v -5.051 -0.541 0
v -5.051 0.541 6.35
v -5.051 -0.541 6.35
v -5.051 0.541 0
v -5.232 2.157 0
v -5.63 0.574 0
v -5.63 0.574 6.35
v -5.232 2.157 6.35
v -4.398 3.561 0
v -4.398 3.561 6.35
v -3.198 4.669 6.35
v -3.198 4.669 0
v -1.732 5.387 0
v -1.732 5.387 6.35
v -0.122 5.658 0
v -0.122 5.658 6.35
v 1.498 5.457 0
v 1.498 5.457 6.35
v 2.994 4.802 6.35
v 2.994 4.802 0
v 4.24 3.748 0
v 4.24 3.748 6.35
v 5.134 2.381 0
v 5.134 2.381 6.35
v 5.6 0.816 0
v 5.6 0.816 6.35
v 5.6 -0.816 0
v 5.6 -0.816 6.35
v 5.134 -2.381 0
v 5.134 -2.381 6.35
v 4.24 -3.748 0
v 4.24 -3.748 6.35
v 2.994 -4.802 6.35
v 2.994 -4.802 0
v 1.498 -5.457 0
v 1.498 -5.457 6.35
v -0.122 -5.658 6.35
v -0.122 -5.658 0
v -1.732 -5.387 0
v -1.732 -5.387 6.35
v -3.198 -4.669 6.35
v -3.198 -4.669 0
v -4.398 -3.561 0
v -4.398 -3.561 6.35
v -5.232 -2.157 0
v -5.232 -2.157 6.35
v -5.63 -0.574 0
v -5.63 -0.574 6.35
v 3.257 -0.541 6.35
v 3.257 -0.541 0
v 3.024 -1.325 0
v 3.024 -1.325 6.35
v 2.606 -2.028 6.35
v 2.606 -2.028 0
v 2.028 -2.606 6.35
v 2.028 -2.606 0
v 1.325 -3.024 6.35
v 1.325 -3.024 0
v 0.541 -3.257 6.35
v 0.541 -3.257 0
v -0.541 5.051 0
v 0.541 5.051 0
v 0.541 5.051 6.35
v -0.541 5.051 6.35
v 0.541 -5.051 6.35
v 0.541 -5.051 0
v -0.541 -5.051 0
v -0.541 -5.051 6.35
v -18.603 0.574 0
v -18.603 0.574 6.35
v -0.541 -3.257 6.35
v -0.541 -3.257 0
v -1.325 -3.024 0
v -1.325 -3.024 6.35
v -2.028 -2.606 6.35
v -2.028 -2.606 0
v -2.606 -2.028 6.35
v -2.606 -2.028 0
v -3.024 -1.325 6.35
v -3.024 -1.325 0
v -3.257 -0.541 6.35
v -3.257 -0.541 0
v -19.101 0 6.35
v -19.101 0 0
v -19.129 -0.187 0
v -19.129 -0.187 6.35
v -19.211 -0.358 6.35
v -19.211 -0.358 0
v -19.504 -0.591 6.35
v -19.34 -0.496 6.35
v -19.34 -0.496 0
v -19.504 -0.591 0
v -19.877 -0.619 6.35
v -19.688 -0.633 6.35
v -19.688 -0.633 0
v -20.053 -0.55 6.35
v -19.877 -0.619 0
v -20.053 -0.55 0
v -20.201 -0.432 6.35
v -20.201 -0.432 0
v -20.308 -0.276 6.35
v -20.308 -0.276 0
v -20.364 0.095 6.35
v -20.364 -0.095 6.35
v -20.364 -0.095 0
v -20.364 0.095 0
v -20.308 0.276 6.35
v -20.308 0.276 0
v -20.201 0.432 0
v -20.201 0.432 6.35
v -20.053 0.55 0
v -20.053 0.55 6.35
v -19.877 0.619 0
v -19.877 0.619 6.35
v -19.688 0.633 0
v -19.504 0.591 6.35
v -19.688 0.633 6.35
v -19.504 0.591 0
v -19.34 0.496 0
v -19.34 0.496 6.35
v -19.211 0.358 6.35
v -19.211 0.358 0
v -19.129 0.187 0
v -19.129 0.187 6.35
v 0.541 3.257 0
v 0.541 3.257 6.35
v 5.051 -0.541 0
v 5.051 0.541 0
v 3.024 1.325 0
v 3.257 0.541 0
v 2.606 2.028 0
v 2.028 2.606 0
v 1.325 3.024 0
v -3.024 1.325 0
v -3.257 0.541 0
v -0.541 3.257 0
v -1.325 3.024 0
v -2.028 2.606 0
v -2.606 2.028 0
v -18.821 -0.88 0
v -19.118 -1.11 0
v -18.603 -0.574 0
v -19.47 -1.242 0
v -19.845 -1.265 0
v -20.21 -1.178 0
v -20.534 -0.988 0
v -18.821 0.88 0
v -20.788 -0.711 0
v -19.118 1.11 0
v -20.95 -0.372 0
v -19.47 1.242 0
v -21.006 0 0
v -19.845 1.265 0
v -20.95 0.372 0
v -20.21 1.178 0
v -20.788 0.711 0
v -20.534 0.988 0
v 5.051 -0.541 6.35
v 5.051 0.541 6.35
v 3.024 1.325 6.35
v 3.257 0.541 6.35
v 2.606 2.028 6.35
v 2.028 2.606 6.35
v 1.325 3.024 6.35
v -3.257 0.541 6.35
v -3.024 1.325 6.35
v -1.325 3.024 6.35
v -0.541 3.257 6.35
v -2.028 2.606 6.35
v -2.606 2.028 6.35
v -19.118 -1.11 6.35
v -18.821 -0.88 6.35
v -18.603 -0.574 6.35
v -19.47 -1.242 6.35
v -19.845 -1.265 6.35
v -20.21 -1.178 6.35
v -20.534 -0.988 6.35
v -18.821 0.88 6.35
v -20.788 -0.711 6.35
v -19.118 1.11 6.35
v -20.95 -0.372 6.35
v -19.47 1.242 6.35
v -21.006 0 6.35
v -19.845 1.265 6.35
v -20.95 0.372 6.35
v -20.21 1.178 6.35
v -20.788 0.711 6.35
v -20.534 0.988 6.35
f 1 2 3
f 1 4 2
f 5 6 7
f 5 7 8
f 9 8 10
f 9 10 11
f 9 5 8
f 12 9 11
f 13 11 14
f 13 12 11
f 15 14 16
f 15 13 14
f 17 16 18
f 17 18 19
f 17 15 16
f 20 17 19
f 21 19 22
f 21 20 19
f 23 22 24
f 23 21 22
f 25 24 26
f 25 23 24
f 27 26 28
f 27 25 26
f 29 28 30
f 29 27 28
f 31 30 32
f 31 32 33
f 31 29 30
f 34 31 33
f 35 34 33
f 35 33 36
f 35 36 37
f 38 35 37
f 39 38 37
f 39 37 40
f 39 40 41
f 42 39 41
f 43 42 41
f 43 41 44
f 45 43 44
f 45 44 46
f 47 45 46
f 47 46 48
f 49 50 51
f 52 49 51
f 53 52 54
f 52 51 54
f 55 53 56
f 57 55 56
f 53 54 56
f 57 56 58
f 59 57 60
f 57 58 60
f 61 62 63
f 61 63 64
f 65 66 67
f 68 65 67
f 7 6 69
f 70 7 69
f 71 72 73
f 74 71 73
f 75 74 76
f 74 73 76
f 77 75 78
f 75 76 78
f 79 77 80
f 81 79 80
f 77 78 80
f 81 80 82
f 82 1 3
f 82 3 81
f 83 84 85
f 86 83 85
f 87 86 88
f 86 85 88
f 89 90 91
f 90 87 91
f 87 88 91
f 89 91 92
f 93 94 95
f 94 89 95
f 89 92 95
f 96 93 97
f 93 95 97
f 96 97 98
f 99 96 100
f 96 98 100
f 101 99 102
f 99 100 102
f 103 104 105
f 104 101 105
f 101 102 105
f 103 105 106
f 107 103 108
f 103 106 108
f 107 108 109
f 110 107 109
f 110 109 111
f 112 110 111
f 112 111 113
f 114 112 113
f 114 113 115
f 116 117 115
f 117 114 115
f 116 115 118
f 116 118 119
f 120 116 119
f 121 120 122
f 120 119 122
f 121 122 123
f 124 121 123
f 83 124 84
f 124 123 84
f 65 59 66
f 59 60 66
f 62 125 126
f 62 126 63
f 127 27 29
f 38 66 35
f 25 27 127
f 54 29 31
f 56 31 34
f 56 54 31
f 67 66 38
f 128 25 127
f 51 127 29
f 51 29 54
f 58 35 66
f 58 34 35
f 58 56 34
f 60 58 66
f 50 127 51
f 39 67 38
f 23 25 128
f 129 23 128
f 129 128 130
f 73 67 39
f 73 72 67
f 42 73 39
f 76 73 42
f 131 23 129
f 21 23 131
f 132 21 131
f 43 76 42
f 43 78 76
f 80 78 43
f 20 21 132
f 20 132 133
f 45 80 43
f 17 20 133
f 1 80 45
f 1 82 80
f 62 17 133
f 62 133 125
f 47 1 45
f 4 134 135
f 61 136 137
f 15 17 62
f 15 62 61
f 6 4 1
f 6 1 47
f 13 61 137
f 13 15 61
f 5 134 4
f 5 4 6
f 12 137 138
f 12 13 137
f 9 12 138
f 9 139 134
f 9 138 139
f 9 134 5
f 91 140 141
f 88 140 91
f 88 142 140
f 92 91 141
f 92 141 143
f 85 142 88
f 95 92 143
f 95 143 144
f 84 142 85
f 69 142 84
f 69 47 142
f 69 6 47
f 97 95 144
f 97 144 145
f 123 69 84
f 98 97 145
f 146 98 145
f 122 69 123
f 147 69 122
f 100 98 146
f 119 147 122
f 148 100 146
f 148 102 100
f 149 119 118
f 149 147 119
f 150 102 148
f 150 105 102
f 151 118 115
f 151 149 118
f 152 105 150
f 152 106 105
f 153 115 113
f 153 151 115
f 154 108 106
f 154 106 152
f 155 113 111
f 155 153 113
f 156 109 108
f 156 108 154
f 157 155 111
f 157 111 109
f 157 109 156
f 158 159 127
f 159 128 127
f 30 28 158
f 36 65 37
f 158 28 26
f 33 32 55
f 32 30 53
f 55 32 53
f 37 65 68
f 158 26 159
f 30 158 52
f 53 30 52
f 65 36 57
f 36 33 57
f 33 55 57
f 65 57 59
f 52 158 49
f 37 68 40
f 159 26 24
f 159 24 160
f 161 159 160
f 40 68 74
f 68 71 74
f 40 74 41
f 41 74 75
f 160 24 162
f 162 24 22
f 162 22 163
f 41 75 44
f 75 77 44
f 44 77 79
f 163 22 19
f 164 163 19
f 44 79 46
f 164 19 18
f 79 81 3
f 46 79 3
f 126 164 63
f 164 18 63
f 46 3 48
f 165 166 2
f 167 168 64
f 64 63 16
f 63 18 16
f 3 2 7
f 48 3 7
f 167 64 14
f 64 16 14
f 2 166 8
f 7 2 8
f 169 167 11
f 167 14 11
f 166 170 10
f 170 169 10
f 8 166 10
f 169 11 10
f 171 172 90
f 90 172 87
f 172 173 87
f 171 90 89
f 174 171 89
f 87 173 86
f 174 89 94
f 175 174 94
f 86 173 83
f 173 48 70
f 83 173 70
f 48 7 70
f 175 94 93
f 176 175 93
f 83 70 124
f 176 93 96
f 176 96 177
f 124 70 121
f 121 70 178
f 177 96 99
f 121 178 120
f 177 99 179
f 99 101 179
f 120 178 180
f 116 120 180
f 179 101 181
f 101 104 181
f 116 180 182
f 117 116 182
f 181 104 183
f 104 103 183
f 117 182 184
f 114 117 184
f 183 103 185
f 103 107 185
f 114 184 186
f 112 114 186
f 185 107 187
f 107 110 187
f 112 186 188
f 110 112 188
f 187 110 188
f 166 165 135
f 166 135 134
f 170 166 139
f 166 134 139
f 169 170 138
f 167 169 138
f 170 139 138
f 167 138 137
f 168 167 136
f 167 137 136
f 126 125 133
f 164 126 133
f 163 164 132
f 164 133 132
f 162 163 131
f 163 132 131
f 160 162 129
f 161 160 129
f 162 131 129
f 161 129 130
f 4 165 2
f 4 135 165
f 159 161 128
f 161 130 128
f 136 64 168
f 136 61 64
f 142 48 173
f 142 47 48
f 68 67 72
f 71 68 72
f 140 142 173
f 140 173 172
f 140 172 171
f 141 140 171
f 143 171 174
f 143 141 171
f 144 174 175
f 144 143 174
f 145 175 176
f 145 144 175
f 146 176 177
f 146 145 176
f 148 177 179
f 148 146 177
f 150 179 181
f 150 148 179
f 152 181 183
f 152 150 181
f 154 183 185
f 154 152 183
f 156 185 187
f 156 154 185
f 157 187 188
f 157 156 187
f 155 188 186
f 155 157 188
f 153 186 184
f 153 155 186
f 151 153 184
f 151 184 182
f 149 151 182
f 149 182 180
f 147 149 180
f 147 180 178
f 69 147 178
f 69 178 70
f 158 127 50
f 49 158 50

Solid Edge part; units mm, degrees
sketch "Sketch1" plane through (0, 0, 0) normal (0, 0, 1) x (1, 0, 0)
  line L0 (-5.6298, -0.5741) -> (-18.603, -0.5741)
  line L1 (-5.6298, 0.5741) -> (-18.603, 0.5741)
  arc A0 (-5.6298, 0.5741) -> (-5.6298, -0.5741) centre (0, 0) cw
  arc A1 (-18.603, -0.5741) -> (-18.603, 0.5741) centre (-19.7358, 0) cw
  arc A2 (0.541, 3.2574) -> (3.2574, 0.541) centre (0, 0) cw
  line L2 (3.2574, 0.541) -> (5.0511, 0.541)
  line L3 (5.0511, 0.541) -> (5.0511, -0.541)
  line L4 (5.0511, -0.541) -> (3.2574, -0.541)
  arc A3 (3.2574, -0.541) -> (0.541, -3.2574) centre (0, 0) cw
  line L5 (0.541, -3.2574) -> (0.541, -5.0511)
  line L6 (0.541, -5.0511) -> (-0.541, -5.0511)
  line L7 (-0.541, -5.0511) -> (-0.541, -3.2574)
  line L8 (-5.0511, -0.541) -> (-3.2574, -0.541)
  line L9 (-5.0511, 0.541) -> (-5.0511, -0.541)
  line L10 (-3.2574, 0.541) -> (-5.0511, 0.541)
  arc A4 (-3.2574, 0.541) -> (-0.541, 3.2574) centre (0, 0) cw
  line L11 (-0.541, 5.0511) -> (-0.541, 3.2574)
  line L12 (0.541, 5.0511) -> (-0.541, 5.0511)
  line L13 (0.541, 3.2574) -> (0.541, 5.0511)
  arc A5 (-0.541, -3.2574) -> (-3.2574, -0.541) centre (0, 0) cw
  circle A6 centre (-19.7358, 0) radius 0.635
extrude "Protrusion1" add sketch "Sketch1" along normal blind 6.35
